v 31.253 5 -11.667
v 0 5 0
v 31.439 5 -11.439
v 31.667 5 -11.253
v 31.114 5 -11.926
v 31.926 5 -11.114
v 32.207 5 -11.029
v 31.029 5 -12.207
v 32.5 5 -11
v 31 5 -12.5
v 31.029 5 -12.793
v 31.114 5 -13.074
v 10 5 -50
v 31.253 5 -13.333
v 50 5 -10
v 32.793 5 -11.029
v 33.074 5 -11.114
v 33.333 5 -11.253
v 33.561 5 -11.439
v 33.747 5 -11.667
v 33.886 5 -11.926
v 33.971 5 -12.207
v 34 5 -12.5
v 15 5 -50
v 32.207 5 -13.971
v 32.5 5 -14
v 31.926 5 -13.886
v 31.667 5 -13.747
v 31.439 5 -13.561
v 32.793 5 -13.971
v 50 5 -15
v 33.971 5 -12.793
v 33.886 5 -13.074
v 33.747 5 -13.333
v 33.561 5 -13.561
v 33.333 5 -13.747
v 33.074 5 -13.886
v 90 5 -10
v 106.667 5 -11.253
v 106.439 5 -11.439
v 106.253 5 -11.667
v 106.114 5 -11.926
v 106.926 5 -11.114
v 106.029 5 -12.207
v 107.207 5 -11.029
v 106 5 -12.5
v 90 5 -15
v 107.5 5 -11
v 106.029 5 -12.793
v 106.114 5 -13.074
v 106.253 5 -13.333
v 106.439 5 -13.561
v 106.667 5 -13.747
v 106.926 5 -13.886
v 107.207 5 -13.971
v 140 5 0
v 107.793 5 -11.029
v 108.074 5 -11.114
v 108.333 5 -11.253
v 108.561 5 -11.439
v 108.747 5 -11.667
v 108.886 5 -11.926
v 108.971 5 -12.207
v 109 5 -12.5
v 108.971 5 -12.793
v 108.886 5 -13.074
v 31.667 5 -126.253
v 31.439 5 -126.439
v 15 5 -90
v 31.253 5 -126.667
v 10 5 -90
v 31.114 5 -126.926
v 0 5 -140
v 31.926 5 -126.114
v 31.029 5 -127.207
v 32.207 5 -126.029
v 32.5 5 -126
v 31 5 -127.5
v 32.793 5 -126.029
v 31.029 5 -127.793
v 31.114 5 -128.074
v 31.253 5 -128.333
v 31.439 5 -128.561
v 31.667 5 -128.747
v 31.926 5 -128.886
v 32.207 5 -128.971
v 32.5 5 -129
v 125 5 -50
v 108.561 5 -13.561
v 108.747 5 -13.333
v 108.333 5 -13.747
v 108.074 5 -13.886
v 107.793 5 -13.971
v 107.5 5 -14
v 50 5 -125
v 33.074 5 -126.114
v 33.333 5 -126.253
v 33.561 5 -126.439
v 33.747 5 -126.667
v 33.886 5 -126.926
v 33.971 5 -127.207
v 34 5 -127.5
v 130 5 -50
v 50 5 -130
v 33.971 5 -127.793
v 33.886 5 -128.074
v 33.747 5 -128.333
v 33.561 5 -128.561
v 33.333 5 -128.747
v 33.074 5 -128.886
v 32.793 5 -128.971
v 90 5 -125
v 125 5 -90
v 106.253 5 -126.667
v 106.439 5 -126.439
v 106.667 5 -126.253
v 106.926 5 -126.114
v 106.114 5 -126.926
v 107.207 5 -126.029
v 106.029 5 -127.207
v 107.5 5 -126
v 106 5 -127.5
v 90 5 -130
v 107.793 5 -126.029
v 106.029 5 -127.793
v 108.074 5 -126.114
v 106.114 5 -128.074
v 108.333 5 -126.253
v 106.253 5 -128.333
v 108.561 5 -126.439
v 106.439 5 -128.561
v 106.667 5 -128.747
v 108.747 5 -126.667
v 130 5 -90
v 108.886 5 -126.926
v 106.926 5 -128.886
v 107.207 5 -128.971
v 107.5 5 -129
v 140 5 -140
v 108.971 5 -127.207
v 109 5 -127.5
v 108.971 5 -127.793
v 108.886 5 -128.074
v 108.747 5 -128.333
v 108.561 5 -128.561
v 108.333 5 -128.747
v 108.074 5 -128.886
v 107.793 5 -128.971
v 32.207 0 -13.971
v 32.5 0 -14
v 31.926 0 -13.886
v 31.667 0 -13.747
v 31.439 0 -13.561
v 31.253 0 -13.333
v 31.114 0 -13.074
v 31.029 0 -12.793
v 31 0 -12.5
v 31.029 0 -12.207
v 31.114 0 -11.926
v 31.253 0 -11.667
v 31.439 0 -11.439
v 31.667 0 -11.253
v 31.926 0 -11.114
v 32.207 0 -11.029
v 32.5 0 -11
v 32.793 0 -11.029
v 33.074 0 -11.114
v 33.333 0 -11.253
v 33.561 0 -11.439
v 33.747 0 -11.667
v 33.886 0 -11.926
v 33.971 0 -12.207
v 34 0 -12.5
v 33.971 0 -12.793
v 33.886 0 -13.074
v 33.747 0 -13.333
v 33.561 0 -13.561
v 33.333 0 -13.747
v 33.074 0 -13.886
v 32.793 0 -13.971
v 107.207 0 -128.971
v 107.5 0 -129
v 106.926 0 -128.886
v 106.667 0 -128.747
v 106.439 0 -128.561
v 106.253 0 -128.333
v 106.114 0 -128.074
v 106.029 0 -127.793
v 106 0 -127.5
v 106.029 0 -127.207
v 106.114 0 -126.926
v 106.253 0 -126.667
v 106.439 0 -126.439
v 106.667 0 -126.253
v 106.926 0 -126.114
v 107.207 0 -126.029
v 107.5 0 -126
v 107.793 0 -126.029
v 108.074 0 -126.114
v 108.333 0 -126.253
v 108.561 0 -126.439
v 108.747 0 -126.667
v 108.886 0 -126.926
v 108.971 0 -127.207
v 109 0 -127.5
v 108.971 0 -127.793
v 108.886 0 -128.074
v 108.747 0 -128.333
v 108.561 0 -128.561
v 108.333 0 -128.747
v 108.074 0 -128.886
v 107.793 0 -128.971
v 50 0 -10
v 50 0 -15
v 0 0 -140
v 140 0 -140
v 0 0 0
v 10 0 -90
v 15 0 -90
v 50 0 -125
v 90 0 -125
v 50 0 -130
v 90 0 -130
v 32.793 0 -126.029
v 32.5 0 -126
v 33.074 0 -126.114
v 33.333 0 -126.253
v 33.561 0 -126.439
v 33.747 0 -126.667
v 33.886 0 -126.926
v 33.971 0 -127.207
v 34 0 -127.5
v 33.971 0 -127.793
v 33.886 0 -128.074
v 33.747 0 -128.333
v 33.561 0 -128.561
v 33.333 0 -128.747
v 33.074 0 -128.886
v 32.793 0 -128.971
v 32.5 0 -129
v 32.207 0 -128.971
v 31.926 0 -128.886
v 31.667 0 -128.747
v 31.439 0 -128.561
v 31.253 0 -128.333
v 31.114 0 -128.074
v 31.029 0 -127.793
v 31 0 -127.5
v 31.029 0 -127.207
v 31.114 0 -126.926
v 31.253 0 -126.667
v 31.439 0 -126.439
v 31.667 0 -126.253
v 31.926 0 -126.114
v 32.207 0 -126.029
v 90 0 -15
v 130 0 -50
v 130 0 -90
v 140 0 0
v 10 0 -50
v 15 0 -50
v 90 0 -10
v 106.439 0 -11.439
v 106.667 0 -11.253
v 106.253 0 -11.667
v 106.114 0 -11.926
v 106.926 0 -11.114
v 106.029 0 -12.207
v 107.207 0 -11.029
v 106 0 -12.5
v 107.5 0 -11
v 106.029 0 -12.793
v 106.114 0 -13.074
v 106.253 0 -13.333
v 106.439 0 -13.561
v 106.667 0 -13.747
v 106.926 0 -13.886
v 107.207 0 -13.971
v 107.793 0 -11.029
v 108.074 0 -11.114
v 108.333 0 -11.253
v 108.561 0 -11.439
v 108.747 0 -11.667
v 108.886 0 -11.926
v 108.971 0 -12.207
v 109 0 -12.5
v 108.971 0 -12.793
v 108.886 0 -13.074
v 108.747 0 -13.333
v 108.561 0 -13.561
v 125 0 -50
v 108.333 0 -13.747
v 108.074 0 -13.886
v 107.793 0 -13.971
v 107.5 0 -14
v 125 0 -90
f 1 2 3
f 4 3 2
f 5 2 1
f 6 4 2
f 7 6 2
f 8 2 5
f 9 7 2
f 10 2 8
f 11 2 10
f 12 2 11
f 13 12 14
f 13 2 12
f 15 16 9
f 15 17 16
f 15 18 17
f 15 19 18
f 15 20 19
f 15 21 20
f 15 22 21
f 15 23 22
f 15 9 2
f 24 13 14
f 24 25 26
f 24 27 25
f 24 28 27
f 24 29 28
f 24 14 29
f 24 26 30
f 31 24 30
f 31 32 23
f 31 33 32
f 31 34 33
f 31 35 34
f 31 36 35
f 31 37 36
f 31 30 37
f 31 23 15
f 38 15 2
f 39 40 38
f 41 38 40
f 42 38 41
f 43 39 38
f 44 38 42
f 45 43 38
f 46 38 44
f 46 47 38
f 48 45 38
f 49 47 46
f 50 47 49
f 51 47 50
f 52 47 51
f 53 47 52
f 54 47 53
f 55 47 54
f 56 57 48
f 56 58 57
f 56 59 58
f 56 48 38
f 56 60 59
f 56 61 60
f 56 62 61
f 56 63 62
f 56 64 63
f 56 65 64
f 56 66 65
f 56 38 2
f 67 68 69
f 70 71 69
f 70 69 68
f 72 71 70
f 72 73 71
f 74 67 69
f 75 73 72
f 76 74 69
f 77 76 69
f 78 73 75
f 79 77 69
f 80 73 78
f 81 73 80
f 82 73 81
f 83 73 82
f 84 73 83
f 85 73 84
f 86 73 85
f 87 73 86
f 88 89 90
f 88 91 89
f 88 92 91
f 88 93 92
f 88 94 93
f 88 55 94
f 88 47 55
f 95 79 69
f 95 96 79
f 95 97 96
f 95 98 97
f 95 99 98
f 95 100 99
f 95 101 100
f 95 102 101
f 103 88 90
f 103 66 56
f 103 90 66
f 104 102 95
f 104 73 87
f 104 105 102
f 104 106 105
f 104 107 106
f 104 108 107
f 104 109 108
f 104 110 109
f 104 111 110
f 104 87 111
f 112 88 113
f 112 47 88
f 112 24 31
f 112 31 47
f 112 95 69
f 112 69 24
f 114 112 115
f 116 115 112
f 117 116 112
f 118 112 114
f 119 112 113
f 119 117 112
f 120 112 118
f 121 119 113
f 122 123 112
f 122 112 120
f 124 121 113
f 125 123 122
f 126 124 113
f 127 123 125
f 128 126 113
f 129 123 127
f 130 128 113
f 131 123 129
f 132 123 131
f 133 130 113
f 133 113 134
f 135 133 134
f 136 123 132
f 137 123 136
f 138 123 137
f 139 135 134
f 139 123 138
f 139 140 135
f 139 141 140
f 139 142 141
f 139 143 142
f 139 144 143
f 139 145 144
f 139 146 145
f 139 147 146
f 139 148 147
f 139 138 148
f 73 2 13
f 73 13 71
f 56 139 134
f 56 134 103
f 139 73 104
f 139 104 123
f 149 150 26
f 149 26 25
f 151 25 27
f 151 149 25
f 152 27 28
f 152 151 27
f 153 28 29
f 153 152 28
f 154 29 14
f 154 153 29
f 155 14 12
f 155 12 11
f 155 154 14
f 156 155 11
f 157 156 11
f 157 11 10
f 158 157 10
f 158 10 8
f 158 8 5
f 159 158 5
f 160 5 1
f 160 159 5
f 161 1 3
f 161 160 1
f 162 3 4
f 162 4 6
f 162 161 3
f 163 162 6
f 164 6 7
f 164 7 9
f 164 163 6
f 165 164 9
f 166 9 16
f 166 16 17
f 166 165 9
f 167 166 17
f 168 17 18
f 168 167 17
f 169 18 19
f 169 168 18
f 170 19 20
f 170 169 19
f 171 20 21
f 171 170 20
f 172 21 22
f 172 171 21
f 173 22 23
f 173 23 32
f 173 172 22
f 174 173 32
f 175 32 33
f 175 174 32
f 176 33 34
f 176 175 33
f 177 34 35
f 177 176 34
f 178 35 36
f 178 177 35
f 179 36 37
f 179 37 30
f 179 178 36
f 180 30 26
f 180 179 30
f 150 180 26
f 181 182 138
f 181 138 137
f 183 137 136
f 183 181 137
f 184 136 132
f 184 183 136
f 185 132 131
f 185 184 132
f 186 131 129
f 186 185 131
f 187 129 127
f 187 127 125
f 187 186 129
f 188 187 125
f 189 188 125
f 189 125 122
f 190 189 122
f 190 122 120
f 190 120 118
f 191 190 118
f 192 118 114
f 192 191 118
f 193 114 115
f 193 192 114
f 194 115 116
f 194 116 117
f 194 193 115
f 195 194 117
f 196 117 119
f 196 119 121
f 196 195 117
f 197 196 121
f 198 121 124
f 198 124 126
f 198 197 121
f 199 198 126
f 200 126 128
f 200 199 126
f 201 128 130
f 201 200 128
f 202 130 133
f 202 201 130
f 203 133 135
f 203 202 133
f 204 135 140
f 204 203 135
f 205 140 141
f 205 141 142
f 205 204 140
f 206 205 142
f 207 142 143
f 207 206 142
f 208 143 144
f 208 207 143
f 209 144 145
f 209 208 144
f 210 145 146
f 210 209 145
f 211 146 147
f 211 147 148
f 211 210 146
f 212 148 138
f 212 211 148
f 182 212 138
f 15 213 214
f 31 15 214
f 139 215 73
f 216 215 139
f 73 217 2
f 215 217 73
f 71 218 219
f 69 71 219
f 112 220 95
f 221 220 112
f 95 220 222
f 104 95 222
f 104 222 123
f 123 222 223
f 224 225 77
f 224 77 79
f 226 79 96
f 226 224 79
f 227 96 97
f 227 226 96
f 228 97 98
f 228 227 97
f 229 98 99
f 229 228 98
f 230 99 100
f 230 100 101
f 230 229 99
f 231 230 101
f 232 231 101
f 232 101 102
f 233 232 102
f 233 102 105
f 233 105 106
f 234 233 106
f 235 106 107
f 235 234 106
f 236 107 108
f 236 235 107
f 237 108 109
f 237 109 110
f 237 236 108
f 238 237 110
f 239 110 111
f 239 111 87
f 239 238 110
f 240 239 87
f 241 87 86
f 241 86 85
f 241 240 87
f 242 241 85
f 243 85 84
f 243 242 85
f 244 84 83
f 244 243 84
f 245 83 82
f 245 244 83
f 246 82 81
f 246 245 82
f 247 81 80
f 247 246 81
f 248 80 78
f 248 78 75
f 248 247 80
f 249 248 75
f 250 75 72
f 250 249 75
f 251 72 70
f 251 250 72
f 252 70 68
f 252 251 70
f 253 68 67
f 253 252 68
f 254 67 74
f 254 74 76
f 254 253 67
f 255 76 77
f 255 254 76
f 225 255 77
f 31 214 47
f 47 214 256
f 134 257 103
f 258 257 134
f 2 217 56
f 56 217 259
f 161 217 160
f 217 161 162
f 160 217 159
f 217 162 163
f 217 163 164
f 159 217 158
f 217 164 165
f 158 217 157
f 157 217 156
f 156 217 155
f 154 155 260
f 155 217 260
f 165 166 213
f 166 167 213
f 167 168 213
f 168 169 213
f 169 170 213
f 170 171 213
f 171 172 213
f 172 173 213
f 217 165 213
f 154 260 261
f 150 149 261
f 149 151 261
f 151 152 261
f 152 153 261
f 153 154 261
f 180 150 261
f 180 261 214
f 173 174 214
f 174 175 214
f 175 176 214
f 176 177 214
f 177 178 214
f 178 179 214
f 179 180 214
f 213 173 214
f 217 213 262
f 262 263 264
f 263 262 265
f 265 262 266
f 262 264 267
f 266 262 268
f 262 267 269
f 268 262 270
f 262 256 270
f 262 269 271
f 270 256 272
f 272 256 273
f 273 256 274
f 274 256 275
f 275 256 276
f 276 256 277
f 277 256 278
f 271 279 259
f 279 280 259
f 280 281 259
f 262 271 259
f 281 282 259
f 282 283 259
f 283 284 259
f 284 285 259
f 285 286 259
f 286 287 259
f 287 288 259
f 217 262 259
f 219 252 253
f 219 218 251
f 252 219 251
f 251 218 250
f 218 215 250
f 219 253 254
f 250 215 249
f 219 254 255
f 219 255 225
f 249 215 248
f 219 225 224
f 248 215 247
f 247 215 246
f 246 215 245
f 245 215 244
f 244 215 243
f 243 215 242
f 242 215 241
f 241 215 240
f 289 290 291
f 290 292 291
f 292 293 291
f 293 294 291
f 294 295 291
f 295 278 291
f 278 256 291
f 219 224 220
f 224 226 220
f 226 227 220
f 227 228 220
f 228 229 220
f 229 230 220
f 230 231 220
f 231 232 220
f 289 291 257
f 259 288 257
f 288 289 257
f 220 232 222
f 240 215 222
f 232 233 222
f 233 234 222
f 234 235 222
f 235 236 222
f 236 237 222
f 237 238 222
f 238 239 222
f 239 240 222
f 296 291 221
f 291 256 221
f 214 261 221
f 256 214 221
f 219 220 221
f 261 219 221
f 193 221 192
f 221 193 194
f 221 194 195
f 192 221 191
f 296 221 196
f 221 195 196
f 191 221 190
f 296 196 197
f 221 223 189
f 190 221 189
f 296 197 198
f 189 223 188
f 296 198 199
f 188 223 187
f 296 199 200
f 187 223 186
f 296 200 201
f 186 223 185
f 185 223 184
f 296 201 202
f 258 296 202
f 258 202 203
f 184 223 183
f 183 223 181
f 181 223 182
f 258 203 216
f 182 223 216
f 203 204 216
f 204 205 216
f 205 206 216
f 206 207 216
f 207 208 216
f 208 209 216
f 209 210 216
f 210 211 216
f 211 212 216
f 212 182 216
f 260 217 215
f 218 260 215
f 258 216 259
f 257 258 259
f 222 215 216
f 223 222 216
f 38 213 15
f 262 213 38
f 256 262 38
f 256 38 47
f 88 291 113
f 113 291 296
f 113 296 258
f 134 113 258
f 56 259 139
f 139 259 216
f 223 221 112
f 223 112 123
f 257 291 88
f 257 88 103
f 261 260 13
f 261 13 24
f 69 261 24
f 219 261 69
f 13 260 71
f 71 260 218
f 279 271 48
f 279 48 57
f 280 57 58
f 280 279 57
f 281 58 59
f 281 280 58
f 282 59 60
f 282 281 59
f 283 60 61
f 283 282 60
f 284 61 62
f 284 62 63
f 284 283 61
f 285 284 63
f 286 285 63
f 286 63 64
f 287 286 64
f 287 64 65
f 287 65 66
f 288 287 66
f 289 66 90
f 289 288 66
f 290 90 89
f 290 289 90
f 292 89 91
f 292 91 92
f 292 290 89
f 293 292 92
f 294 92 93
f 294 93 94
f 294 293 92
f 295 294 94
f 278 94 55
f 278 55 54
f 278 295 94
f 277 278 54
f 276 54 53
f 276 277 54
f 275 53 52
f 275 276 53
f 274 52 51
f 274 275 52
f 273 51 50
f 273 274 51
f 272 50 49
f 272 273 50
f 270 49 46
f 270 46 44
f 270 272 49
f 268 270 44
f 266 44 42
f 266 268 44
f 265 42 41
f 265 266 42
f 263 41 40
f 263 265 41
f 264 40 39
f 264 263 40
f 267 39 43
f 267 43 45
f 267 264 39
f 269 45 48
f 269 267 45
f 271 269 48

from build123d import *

# Parameters (mm, degrees)
CROQUIS2_W              = 140
CROQUIS2_H              = 140
CROQUIS2_R              = 1.5
CROQUIS2_W_2            = 40
CROQUIS2_H_2            = 5
CROQUIS2_W_3            = 5
CROQUIS2_H_3            = 40
SALIENTE_EXTRUIR1_DEPTH = 5


with BuildPart() as part:
    # Croquis2 → Saliente-Extruir1 (new body)
    with BuildSketch(Plane(origin=(0, 0, 0), x_dir=(1, 0, 0), z_dir=(0, 1, 0))):
        with Locations((70, 70)):
            Rectangle(CROQUIS2_W, CROQUIS2_H)
        with Locations(Location((32.5, 127.5, 0), (0, 0, 270))):
            Circle(CROQUIS2_R, mode=Mode.SUBTRACT)
        with Locations(Location((107.5, 127.5, 0), (0, 0, 90))):
            Circle(CROQUIS2_R, mode=Mode.SUBTRACT)
        with Locations(Location((107.5, 12.5, 0), (0, 0, 270))):
            Circle(CROQUIS2_R, mode=Mode.SUBTRACT)
        with Locations(Location((32.5, 12.5, 0), (0, 0, 90))):
            Circle(CROQUIS2_R, mode=Mode.SUBTRACT)
        with Locations((70, 127.5)):
            Rectangle(CROQUIS2_W_2, CROQUIS2_H_2, mode=Mode.SUBTRACT)
        with Locations((70, 12.5)):
            Rectangle(CROQUIS2_W_2, CROQUIS2_H_2, mode=Mode.SUBTRACT)
        with Locations((127.5, 70)):
            Rectangle(CROQUIS2_W_3, CROQUIS2_H_3, mode=Mode.SUBTRACT)
        with Locations((12.5, 70)):
            Rectangle(CROQUIS2_W_3, CROQUIS2_H_3, mode=Mode.SUBTRACT)
    extrude(amount=SALIENTE_EXTRUIR1_DEPTH)


solid = part.part
